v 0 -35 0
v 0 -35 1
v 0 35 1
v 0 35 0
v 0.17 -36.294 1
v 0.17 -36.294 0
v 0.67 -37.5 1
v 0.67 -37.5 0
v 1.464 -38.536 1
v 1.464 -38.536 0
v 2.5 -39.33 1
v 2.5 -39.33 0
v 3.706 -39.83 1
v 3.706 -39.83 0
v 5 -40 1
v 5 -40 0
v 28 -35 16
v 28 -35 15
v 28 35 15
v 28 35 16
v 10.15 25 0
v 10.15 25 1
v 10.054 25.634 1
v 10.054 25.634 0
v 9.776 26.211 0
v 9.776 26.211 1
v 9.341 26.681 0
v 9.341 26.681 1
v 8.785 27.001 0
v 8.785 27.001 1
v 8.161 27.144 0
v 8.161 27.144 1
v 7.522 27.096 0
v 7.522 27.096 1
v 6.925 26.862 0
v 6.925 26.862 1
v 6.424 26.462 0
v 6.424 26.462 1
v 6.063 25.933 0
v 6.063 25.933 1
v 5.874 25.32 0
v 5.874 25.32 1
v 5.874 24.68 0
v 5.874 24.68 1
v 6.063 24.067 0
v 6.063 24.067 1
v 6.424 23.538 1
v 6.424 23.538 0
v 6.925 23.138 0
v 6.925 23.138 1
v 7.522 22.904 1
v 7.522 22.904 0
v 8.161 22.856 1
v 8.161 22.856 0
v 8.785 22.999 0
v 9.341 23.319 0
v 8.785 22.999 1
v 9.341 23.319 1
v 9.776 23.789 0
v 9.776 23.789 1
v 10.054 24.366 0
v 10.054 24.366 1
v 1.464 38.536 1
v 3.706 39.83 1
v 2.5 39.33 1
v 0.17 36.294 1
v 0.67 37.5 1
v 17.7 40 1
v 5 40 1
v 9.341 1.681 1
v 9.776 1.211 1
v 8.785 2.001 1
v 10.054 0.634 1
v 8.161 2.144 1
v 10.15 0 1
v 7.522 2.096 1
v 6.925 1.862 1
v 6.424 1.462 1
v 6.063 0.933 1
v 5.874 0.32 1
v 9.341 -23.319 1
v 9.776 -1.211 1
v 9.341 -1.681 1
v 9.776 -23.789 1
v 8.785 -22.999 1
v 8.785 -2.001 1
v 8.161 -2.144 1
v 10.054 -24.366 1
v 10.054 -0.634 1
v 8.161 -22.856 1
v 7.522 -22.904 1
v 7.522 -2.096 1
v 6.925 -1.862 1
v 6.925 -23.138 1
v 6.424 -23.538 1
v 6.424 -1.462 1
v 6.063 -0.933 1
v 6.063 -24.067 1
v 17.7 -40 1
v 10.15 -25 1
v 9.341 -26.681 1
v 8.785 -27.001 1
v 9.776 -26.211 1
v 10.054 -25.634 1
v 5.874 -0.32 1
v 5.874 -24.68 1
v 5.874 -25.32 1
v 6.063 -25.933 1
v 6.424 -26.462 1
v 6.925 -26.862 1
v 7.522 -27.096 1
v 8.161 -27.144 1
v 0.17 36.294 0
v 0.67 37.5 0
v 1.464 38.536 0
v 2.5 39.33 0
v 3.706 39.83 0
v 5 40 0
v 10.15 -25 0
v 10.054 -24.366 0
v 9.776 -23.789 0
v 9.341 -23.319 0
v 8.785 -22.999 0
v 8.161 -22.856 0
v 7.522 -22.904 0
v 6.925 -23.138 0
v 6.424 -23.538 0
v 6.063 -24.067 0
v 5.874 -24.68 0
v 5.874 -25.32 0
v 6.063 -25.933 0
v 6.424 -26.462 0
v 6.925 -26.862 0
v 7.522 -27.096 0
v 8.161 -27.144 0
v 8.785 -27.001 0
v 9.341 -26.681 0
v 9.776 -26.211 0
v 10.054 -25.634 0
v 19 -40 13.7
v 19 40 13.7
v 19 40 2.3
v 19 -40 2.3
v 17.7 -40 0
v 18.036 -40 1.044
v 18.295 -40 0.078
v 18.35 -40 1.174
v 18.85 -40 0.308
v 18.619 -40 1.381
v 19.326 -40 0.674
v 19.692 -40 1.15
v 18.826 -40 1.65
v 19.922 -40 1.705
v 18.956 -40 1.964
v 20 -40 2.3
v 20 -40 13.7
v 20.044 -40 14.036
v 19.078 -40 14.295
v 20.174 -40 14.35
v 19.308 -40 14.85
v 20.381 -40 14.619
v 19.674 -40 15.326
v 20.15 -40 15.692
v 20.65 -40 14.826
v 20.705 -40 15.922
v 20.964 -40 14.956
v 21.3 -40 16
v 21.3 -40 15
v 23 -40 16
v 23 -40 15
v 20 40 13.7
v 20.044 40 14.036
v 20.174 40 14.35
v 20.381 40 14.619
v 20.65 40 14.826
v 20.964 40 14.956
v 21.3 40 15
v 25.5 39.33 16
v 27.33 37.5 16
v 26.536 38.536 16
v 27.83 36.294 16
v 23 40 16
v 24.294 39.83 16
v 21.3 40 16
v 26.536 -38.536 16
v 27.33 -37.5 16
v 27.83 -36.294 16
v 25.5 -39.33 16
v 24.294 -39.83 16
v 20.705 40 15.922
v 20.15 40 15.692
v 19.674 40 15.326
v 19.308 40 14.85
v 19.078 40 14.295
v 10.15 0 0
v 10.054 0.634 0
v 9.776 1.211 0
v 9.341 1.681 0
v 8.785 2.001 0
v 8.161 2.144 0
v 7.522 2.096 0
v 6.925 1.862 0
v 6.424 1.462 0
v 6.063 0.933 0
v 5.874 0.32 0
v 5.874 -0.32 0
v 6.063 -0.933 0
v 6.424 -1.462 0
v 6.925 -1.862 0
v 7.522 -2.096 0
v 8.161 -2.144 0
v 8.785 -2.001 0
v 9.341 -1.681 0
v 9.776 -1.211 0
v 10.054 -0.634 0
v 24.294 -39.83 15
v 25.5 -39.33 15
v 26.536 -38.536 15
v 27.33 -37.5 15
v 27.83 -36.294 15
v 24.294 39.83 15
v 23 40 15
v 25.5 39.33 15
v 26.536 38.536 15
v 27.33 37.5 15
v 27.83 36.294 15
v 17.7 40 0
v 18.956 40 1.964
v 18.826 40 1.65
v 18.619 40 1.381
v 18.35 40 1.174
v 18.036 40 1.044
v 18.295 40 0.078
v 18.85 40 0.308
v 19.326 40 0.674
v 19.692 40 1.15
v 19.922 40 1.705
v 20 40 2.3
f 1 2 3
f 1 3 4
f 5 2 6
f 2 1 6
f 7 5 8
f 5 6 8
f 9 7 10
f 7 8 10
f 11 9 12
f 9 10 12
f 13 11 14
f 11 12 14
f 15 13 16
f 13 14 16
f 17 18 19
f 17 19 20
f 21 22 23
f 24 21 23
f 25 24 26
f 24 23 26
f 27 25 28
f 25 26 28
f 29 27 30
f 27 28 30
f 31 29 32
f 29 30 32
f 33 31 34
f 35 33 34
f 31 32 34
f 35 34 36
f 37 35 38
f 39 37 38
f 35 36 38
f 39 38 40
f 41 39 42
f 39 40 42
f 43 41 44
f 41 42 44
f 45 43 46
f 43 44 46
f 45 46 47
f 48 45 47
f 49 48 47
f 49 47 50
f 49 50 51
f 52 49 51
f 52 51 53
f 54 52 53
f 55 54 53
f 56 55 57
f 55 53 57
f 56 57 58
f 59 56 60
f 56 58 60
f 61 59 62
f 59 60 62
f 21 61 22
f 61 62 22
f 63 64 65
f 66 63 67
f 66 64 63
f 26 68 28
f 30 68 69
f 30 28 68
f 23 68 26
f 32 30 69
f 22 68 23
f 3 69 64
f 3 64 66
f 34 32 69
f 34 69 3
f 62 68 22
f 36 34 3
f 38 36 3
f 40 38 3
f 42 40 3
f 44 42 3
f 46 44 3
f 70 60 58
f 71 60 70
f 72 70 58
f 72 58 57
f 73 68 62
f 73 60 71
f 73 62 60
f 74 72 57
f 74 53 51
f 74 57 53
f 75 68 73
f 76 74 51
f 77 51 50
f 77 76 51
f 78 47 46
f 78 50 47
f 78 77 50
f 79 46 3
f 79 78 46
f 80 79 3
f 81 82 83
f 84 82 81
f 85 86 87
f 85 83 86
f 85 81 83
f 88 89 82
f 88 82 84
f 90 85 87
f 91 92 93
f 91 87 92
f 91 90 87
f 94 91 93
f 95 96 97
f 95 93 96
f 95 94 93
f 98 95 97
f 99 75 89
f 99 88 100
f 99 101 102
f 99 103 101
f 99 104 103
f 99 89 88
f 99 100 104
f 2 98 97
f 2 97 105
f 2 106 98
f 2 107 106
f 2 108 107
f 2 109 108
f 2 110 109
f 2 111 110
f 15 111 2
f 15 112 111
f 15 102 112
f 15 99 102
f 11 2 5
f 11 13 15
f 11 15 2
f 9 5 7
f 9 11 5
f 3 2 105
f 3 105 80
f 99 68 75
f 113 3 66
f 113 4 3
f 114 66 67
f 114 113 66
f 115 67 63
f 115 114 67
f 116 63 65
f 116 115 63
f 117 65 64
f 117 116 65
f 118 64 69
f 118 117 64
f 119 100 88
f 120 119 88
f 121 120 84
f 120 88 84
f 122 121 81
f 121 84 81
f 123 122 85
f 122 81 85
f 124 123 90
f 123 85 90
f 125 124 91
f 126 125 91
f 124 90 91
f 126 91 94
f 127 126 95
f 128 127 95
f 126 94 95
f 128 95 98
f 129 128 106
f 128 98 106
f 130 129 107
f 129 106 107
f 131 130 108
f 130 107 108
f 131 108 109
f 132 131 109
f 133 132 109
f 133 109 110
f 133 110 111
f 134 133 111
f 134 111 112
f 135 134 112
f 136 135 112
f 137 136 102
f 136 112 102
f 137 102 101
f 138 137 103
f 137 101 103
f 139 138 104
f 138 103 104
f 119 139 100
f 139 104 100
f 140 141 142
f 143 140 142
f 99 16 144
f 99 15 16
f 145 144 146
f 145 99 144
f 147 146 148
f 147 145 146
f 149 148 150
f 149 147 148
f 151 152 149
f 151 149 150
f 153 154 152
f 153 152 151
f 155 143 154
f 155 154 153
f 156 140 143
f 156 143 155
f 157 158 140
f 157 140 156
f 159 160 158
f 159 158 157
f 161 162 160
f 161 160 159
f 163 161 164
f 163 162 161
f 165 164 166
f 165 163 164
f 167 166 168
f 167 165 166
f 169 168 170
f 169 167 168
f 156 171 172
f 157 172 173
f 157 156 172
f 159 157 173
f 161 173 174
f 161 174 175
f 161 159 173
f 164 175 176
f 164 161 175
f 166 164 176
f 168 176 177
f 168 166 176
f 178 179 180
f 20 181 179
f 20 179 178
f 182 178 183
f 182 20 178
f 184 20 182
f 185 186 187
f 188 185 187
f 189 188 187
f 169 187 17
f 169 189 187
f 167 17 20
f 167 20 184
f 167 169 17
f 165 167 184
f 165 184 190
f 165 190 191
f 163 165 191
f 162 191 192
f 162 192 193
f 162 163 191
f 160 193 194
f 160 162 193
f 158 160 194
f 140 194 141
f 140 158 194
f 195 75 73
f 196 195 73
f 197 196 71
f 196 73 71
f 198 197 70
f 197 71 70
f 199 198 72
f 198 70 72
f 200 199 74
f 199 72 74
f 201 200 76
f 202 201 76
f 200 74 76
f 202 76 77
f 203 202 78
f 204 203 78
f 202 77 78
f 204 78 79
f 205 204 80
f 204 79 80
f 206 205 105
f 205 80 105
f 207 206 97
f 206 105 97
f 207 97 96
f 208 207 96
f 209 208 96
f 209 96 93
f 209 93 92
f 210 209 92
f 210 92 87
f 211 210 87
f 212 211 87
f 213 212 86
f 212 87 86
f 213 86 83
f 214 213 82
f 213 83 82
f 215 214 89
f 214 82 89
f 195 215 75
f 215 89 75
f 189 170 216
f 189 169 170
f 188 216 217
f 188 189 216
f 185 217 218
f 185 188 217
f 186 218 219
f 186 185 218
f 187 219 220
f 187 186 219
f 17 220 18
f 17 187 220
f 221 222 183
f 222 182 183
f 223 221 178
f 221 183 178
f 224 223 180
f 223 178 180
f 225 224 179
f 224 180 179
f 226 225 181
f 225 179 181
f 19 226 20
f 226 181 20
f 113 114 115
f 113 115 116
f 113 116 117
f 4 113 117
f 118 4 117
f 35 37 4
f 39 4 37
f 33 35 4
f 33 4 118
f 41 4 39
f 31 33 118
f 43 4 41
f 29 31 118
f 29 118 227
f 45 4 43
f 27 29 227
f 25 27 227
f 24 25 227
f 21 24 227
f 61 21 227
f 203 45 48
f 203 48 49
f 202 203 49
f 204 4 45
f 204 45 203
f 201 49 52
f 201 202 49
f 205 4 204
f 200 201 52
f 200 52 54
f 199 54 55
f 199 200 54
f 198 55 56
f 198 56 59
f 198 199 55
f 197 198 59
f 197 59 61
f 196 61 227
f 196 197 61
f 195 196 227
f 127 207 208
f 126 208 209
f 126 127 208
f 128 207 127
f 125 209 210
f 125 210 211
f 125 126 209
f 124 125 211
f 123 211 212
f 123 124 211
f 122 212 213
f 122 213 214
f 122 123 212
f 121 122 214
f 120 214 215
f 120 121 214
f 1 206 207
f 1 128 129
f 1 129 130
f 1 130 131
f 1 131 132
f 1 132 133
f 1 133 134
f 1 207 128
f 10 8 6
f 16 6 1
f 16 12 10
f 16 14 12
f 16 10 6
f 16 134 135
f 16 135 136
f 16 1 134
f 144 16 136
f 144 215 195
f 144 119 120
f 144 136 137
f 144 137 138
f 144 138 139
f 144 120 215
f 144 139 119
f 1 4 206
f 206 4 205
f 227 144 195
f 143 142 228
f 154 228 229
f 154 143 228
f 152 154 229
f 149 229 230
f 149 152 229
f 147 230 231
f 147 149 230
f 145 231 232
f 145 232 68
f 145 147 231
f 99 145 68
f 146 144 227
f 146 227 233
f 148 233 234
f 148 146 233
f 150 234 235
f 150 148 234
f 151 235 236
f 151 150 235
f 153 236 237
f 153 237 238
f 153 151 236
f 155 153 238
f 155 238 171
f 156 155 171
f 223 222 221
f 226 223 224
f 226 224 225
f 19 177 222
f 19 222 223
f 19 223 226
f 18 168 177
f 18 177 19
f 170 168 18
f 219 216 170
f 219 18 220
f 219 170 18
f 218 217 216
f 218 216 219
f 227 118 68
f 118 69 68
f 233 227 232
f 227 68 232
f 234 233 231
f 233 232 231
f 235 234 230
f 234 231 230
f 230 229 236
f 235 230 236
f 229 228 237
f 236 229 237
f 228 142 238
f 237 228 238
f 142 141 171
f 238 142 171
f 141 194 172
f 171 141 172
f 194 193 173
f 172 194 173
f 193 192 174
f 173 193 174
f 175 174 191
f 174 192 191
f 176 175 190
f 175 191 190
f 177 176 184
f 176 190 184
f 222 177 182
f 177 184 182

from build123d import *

# Parameters (mm, degrees)
F1_DEPTH = 40
F2_R     = 2.15
F3_DEPTH = 1
F4_R     = 5


with BuildPart() as f1:
    # F0 (on Front) → F1 (new body, symmetric)
    with BuildSketch(Plane.XZ):
        with BuildLine():
            Line((0, 1), (0, 0))
            Line((0, 0), (17.7, 0))
            ThreePointArc((17.7, 0), (19.326346, 0.673654), (20, 2.3))
            Line((20, 2.3), (20, 13.7))
            ThreePointArc((20, 13.7), (20.380761, 14.619239), (21.3, 15))
            Line((21.3, 15), (28, 15))
            Line((28, 15), (28, 16))
            Line((28, 16), (21.3, 16))
            ThreePointArc((21.3, 16), (19.673654, 15.326346), (19, 13.7))
            Line((19, 13.7), (19, 2.3))
            ThreePointArc((19, 2.3), (18.619239, 1.380761), (17.7, 1))
            Line((17.7, 1), (0, 1))
        make_face()
    extrude(amount=F1_DEPTH, both=True)

    # F2 (on face) → F3 (cut, through all)
    with BuildSketch(Plane.XY.offset(1)):
        with Locations((8, 25)):
            Circle(F2_R)
        with Locations((8, 0)):
            Circle(F2_R)
        with Locations((8, -25)):
            Circle(F2_R)
    extrude(amount=-F3_DEPTH, mode=Mode.SUBTRACT)

    # F4
    f4_edges = [f1.edges().sort_by_distance(p)[0] for p in [
        (0, 40, 0.5),
        (0, -40, 0.5),
        (28, -40, 15.5),
        (28, 40, 15.5),
    ]]
    fillet(f4_edges, radius=F4_R)


solid = f1.part
